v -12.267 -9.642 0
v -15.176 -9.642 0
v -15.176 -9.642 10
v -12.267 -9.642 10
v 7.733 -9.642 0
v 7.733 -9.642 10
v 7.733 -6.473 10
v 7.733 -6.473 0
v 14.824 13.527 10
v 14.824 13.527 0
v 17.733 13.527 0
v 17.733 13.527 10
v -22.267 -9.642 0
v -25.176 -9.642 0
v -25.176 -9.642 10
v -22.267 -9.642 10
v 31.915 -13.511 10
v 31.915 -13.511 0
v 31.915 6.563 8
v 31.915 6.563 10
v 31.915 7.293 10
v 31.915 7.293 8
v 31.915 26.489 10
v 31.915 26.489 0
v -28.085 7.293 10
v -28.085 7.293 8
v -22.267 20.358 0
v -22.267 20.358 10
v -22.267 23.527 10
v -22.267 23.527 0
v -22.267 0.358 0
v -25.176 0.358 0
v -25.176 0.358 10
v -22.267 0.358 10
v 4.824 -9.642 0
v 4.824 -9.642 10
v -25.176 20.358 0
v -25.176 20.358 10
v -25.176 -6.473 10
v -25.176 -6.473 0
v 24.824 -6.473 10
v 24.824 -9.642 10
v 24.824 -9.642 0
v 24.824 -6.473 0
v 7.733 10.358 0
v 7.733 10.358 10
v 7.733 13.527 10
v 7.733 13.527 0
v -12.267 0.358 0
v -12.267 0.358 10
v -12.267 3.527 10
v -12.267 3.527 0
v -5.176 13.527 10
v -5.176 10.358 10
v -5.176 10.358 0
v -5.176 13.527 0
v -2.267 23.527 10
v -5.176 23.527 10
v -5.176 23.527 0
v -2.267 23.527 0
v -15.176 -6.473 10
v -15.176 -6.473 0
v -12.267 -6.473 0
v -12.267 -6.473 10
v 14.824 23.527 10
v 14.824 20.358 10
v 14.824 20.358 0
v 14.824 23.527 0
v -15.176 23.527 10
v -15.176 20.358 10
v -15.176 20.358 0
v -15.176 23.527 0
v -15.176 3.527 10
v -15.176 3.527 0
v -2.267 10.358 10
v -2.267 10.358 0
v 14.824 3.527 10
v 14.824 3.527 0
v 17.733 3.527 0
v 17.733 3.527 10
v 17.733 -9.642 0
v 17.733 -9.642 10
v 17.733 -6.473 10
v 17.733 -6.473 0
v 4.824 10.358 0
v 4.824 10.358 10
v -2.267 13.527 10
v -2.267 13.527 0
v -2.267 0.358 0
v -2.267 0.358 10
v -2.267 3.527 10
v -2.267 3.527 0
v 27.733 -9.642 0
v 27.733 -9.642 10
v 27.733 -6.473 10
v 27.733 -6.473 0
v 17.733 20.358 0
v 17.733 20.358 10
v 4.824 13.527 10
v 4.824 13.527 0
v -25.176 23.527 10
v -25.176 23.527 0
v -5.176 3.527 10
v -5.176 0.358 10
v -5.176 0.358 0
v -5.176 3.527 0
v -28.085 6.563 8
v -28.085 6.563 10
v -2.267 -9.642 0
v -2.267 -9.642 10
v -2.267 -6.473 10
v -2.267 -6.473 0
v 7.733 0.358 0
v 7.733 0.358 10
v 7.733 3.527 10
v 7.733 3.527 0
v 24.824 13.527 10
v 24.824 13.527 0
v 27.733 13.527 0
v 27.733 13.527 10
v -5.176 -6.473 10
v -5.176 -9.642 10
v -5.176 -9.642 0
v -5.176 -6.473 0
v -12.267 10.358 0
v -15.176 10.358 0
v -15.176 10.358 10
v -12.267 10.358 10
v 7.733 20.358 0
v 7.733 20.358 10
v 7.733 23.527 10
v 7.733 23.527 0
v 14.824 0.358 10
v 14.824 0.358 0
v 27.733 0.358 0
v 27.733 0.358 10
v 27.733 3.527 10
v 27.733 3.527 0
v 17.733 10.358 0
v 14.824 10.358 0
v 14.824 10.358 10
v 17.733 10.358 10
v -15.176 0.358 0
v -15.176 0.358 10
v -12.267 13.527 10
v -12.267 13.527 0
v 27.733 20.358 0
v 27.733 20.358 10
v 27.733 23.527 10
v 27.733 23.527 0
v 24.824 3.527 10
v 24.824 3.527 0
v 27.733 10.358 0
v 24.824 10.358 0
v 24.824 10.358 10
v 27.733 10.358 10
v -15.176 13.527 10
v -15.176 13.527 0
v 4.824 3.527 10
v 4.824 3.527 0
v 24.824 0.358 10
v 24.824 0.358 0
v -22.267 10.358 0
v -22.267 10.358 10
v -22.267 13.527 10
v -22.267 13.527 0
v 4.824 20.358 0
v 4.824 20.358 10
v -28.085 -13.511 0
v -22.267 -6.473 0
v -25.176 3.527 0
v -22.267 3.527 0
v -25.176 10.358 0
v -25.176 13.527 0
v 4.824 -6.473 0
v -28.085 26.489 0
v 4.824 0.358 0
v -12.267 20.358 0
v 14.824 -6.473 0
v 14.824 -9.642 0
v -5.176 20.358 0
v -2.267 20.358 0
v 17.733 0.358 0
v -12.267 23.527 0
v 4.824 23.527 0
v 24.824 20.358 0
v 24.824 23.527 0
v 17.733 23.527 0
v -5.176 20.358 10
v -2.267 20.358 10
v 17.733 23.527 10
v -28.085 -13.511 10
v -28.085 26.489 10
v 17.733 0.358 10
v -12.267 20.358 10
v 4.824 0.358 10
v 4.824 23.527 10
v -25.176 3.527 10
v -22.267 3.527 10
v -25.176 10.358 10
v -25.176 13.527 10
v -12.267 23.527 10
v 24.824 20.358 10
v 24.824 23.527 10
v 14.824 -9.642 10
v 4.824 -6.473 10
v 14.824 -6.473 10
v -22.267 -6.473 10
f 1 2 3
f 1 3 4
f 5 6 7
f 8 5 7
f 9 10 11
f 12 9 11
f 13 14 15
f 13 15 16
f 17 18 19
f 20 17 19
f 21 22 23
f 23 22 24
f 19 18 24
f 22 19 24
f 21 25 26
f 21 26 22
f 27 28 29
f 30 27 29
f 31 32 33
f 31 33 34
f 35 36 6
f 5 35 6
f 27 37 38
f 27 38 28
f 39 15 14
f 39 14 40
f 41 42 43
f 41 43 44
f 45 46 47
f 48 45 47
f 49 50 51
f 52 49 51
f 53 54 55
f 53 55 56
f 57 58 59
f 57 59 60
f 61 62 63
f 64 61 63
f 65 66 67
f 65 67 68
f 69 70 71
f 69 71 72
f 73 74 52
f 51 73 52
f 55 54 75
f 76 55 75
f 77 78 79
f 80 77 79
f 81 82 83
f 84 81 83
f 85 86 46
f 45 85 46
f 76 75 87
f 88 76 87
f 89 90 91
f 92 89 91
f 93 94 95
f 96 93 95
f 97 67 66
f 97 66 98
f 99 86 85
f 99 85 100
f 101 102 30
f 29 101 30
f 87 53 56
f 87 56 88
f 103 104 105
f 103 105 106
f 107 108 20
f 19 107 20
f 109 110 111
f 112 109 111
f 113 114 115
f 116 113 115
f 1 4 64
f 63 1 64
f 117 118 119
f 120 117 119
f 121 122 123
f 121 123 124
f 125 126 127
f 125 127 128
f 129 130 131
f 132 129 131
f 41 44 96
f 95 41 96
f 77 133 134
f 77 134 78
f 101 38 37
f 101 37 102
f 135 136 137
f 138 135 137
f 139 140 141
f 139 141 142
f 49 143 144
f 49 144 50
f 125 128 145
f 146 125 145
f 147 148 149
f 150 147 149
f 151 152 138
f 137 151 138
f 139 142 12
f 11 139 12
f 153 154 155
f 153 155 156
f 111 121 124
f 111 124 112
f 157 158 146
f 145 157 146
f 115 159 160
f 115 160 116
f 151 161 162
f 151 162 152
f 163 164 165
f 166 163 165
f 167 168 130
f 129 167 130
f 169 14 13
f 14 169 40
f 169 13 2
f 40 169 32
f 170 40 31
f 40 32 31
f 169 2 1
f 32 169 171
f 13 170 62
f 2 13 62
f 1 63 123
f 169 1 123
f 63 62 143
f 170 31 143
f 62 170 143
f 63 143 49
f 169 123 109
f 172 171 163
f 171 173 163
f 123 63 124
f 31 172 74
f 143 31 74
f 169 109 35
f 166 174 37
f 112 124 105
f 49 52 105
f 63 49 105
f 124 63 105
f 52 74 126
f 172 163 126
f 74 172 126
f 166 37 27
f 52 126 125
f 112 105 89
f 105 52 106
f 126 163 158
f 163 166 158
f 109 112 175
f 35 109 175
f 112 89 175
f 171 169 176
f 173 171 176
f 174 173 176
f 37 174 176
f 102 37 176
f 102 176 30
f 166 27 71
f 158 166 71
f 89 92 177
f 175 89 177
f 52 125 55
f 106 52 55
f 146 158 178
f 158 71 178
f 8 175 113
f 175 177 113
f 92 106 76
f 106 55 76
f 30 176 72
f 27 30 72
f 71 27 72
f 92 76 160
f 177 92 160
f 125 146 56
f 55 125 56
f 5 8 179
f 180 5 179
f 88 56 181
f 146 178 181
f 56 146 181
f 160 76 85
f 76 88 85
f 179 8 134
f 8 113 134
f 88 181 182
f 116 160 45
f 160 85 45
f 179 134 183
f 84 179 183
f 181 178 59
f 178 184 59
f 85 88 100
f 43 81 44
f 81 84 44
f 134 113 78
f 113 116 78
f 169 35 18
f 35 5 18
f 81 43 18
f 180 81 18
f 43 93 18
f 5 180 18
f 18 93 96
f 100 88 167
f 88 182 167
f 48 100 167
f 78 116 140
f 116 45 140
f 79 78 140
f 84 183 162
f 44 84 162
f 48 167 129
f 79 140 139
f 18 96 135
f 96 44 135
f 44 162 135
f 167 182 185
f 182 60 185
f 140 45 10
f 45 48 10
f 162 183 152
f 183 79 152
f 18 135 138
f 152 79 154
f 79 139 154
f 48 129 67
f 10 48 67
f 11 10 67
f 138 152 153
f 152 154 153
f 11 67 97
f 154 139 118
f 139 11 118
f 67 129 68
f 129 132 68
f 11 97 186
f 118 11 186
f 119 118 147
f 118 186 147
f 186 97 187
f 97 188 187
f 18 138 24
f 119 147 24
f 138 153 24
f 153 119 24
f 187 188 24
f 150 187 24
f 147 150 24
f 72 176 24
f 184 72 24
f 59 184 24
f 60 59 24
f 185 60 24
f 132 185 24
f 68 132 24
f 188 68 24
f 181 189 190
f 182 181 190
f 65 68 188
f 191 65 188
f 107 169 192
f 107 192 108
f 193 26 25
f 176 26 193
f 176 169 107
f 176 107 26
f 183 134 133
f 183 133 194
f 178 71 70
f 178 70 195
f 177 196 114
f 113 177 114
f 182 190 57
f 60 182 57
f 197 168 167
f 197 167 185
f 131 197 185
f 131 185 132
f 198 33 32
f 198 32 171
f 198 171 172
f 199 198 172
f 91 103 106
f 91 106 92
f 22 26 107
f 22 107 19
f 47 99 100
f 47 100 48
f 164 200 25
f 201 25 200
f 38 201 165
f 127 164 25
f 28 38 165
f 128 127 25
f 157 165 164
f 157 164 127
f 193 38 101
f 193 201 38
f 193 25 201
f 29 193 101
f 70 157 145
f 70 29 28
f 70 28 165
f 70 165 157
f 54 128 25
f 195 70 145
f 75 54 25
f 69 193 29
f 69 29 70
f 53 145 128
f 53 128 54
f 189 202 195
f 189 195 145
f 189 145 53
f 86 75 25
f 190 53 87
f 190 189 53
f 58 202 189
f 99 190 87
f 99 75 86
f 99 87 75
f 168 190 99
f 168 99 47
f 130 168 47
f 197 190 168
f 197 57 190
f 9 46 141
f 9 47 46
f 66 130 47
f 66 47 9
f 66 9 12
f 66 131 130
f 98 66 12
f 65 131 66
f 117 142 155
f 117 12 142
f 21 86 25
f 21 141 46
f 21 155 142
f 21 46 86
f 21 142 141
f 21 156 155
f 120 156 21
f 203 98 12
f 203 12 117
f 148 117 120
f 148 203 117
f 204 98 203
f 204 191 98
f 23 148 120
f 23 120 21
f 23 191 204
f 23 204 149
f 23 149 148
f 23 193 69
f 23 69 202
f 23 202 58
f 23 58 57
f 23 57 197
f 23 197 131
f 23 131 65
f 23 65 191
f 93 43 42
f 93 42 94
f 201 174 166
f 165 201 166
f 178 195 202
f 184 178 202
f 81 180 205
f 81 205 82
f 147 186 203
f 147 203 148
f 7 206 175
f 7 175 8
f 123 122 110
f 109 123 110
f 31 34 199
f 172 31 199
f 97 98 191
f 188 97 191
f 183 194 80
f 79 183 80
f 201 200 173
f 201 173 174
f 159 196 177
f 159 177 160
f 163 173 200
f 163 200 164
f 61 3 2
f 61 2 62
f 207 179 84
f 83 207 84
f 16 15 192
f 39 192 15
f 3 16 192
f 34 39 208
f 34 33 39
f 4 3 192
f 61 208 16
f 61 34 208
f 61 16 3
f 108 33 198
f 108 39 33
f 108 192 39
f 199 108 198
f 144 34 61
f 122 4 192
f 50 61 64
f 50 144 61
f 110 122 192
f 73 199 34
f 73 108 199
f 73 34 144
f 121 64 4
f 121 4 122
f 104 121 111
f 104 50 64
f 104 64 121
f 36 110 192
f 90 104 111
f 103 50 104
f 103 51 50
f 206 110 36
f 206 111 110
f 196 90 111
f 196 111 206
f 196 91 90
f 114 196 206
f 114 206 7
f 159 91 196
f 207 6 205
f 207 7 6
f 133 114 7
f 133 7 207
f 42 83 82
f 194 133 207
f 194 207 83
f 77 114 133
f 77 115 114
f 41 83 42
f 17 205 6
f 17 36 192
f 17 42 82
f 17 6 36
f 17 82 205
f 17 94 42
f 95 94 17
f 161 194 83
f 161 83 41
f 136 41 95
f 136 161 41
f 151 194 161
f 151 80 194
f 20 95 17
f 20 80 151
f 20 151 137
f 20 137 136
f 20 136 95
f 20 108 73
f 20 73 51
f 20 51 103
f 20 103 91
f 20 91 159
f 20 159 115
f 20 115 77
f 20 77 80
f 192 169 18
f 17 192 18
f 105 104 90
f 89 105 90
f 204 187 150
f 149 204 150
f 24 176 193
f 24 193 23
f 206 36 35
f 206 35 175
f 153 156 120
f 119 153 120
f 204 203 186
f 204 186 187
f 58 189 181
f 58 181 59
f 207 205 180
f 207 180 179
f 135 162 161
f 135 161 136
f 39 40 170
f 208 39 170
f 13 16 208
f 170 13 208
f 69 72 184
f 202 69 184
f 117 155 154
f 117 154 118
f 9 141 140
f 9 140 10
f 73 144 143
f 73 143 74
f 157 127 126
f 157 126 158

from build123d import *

# Parameters (mm, degrees)
SKETCH1_W           = 60
SKETCH1_H           = 40
BOSS_EXTRUDE1_DEPTH = 10
SKETCH2_W           = 2.909575839
SKETCH2_H           = 3.168204802
CUT_EXTRUDE1_DEPTH  = 10
SKETCH3_W           = 61.747665015
SKETCH3_H           = 0.72949372
CUT_EXTRUDE2_DEPTH  = 2


with BuildPart() as part:
    # Sketch1 → Boss-Extrude1 (new body)
    with BuildSketch(Plane.XY):
        with Locations((1.914893617, 6.489361702)):
            Rectangle(SKETCH1_W, SKETCH1_H)
    extrude(amount=BOSS_EXTRUDE1_DEPTH)

    # Sketch2 → Cut-Extrude1 (cut)
    with BuildSketch(Plane.XY.offset(10)):
        with Locations((-13.721702382, 21.942442266)):
            Rectangle(SKETCH2_W, SKETCH2_H)
        with Locations((-23.721702382, 21.942442266)):
            Rectangle(SKETCH2_W, SKETCH2_H)
        with Locations((-3.721702382, 21.942442266)):
            Rectangle(SKETCH2_W, SKETCH2_H)
        with Locations((6.278297618, 21.942442266)):
            Rectangle(SKETCH2_W, SKETCH2_H)
        with Locations((16.278297619, 21.942442266)):
            Rectangle(SKETCH2_W, SKETCH2_H)
        with Locations((26.278297619, 21.942442266)):
            Rectangle(SKETCH2_W, SKETCH2_H)
        with Locations((-13.721702382, 11.942442266)):
            Rectangle(SKETCH2_W, SKETCH2_H)
        with Locations((-3.721702382, 11.942442266)):
            Rectangle(SKETCH2_W, SKETCH2_H)
        with Locations((6.278297618, 11.942442266)):
            Rectangle(SKETCH2_W, SKETCH2_H)
        with Locations((16.278297619, 11.942442266)):
            Rectangle(SKETCH2_W, SKETCH2_H)
        with Locations((26.278297619, 11.942442266)):
            Rectangle(SKETCH2_W, SKETCH2_H)
        with Locations((-13.721702382, 1.942442266)):
            Rectangle(SKETCH2_W, SKETCH2_H)
        with Locations((-3.721702382, 1.942442266)):
            Rectangle(SKETCH2_W, SKETCH2_H)
        with Locations((6.278297618, 1.942442266)):
            Rectangle(SKETCH2_W, SKETCH2_H)
        with Locations((16.278297619, 1.942442266)):
            Rectangle(SKETCH2_W, SKETCH2_H)
        with Locations((26.278297619, 1.942442266)):
            Rectangle(SKETCH2_W, SKETCH2_H)
        with Locations((-13.721702382, -8.057557734)):
            Rectangle(SKETCH2_W, SKETCH2_H)
        with Locations((-3.721702382, -8.057557734)):
            Rectangle(SKETCH2_W, SKETCH2_H)
        with Locations((6.278297618, -8.057557734)):
            Rectangle(SKETCH2_W, SKETCH2_H)
        with Locations((16.278297619, -8.057557734)):
            Rectangle(SKETCH2_W, SKETCH2_H)
        with Locations((26.278297619, -8.057557734)):
            Rectangle(SKETCH2_W, SKETCH2_H)
        with Locations((-23.721702382, 11.942442266)):
            Rectangle(SKETCH2_W, SKETCH2_H)
        with Locations((-23.721702382, 1.942442266)):
            Rectangle(SKETCH2_W, SKETCH2_H)
        with Locations((-23.721702382, -8.057557734)):
            Rectangle(SKETCH2_W, SKETCH2_H)
    extrude(amount=-CUT_EXTRUDE1_DEPTH, mode=Mode.SUBTRACT)

    # Sketch3 → Cut-Extrude2 (cut)
    with BuildSketch(Plane.XY.offset(10)):
        with Locations((1.945695922, 6.927829606)):
            Rectangle(SKETCH3_W, SKETCH3_H)
    extrude(amount=-CUT_EXTRUDE2_DEPTH, mode=Mode.SUBTRACT)


solid = part.part
